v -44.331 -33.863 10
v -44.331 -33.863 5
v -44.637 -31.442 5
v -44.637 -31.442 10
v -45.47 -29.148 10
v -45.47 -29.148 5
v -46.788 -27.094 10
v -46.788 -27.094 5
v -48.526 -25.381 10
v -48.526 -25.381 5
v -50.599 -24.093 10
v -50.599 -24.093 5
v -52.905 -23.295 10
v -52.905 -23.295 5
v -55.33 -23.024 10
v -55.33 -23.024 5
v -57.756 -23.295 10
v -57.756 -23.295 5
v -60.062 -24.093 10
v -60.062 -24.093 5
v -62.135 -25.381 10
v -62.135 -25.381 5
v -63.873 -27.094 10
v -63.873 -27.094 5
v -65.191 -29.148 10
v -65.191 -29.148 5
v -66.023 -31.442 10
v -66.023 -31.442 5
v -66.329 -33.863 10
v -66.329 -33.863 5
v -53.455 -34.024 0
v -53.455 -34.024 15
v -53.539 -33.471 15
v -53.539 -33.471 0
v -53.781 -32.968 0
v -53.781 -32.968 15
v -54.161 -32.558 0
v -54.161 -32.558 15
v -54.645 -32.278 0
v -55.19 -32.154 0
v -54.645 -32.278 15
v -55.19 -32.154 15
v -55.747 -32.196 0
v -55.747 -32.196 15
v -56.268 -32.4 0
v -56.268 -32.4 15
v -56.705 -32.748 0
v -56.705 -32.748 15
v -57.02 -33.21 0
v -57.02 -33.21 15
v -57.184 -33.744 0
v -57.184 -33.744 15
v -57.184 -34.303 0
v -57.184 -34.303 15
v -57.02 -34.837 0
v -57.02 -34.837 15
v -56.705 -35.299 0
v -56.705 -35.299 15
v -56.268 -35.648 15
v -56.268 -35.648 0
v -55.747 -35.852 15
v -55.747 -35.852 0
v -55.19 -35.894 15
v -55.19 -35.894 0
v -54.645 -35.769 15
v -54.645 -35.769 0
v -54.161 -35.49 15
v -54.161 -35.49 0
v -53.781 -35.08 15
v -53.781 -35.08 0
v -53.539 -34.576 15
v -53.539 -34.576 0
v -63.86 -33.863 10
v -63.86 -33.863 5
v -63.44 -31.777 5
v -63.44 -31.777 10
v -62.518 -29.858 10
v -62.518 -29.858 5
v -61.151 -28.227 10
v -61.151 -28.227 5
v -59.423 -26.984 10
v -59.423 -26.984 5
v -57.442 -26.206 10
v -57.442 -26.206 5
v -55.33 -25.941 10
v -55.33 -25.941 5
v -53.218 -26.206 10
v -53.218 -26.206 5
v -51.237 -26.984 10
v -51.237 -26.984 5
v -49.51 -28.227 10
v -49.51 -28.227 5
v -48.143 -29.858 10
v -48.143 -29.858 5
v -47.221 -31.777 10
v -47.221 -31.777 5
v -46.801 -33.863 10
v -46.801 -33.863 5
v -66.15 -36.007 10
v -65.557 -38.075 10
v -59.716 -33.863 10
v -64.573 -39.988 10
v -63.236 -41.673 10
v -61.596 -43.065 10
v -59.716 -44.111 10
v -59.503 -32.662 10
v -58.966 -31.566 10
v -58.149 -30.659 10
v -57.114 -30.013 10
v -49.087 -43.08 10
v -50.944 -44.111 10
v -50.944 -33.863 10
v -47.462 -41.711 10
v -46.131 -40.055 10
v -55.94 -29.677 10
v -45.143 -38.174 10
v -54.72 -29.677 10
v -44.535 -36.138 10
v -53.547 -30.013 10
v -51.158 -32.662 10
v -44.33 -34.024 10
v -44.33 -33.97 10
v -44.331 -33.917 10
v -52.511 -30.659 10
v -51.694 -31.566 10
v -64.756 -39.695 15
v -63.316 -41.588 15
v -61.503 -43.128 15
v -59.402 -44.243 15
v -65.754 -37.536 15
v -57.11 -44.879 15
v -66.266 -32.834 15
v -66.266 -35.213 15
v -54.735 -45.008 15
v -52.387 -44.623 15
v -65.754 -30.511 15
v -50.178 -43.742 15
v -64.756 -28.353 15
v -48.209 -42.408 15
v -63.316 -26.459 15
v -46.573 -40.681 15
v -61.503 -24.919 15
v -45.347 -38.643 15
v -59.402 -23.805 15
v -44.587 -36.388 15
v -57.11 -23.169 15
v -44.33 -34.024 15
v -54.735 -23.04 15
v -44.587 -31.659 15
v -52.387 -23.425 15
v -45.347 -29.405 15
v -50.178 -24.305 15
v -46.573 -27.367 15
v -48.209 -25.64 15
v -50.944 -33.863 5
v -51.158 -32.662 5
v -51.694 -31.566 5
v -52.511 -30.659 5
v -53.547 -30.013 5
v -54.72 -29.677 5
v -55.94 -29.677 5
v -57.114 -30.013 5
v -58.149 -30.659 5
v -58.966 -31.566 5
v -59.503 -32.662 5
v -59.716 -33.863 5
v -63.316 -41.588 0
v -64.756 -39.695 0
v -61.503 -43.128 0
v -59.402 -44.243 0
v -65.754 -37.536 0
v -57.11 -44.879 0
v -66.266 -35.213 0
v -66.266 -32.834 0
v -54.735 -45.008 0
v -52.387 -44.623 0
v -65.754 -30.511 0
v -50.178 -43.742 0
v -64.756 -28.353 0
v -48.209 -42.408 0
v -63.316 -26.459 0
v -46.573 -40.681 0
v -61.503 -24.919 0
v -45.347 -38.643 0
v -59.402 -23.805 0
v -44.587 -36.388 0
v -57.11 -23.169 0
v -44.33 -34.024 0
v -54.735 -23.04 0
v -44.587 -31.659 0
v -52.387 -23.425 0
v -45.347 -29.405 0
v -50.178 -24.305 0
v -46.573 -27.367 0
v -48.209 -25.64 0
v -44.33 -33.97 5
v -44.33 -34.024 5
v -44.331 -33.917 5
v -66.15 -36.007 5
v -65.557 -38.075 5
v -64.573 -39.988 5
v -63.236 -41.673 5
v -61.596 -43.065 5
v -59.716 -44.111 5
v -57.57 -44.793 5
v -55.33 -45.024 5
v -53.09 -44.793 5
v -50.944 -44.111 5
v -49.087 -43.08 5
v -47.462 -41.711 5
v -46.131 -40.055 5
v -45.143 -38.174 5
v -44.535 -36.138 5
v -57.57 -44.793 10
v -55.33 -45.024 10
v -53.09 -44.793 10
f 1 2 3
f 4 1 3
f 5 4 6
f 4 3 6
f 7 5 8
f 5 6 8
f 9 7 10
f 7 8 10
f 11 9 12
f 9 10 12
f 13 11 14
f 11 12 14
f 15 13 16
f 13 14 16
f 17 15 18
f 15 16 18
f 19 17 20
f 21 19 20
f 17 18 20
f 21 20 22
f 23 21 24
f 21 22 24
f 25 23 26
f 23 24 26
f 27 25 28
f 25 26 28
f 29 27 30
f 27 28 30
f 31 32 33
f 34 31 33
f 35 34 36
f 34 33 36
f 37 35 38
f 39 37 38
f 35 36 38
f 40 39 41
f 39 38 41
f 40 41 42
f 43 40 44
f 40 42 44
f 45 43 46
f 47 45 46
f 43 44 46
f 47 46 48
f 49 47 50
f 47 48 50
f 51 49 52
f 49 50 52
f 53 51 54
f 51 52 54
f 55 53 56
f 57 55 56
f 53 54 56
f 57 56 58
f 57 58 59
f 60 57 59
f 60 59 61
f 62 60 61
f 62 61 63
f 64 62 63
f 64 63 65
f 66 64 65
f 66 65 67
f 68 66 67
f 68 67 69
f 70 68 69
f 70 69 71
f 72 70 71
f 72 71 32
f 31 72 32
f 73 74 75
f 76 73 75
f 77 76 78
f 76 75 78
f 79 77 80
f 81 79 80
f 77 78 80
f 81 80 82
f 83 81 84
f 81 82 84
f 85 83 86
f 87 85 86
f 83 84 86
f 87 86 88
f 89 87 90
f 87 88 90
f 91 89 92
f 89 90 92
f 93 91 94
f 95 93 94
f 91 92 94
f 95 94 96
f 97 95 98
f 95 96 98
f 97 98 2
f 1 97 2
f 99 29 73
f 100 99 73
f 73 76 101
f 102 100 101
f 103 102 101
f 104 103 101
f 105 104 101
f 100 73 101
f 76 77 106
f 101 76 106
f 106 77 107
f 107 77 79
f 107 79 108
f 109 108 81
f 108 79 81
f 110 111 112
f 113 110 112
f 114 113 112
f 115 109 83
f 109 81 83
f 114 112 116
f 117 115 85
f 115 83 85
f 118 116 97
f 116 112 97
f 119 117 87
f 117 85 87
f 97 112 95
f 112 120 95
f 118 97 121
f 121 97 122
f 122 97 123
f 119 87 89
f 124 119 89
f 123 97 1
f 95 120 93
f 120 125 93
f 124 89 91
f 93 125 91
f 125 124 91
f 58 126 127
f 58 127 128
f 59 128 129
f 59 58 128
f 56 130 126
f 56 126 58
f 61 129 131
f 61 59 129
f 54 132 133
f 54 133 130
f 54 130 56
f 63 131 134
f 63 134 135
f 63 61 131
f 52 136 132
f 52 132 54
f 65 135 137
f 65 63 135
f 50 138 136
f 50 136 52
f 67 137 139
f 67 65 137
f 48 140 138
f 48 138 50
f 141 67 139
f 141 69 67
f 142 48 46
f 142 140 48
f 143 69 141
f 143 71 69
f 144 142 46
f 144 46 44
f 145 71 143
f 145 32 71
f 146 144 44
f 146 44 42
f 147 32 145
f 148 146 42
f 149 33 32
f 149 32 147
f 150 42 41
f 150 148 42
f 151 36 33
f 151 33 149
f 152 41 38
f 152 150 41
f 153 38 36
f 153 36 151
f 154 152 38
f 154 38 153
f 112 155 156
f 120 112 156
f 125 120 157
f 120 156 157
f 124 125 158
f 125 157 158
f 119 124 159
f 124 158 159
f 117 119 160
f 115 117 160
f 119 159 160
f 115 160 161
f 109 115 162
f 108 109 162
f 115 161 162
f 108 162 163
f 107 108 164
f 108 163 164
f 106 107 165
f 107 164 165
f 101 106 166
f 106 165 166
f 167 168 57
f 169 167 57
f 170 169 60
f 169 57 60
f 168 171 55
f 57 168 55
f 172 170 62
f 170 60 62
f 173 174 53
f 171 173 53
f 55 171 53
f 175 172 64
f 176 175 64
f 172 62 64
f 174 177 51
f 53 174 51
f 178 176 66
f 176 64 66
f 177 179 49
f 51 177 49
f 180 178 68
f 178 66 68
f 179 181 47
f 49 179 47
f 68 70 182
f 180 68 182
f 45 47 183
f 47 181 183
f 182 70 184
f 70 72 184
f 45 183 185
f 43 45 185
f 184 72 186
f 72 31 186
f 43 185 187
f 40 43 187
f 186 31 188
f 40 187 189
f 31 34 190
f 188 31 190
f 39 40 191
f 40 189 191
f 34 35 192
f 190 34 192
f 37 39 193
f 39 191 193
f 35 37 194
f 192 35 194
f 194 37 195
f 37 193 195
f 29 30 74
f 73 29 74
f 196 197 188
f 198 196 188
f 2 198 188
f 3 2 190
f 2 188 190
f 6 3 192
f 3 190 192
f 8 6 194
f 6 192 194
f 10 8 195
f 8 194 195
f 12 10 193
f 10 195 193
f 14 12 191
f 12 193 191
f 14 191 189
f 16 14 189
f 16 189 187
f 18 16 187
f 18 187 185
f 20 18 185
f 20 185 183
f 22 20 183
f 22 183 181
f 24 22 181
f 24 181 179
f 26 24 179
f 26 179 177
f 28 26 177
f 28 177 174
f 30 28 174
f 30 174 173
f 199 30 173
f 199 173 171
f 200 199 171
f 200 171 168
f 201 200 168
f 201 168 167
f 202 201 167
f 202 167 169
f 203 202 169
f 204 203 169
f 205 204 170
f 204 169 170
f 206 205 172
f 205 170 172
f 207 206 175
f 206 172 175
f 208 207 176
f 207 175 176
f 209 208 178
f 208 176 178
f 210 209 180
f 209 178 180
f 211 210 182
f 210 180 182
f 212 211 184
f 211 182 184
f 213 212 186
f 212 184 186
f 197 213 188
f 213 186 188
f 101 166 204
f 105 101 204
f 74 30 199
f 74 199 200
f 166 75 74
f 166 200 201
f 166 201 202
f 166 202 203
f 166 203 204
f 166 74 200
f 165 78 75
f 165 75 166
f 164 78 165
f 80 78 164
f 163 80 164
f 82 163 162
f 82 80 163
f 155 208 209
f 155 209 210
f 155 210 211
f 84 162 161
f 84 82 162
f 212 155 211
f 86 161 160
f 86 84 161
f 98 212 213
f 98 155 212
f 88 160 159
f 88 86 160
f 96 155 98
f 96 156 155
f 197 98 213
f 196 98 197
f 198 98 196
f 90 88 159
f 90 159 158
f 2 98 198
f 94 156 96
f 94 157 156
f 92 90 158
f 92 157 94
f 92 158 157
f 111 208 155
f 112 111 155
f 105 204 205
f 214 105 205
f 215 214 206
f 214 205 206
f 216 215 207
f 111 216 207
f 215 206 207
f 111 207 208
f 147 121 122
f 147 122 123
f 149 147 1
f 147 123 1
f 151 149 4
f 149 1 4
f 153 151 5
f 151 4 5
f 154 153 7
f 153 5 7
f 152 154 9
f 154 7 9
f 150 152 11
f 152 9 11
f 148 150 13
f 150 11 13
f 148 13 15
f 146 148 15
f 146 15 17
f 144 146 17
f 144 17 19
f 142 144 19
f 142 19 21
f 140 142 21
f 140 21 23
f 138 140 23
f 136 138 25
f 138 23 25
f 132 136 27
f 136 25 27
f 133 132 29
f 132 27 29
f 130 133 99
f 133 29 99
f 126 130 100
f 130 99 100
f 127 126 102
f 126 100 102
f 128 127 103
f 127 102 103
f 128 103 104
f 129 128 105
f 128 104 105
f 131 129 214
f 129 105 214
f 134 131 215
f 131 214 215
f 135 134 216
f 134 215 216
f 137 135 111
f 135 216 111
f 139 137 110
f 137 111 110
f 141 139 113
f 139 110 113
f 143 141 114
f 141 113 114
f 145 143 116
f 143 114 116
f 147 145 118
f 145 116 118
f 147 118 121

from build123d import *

# Parameters (mm, degrees)
F0_R     = 11
F1_DEPTH = 5
F3_DEPTH = 5
F4_R     = 11
F5_DEPTH = 5
F6_R     = 1.875
F7_DEPTH = 25


with BuildPart() as f1:
    # F0 (on Top) → F1 (new body)
    with BuildSketch(Plane.XY):
        with Locations((-55.3302019835, -34.0237878263)):
            Circle(F0_R)
    extrude(amount=F1_DEPTH)

    # F2 (on face) → F3 (join)
    with BuildSketch(Plane.XY.offset(5)):
        with BuildLine():
            Line((-46.800726779, -33.8632795051), (-44.3313730877, -33.8632795051))
            ThreePointArc((-44.3313730877, -33.8632795051), (-55.3302019835, -23.0237878263), (-66.3290308792, -33.8632795051))
            Line((-66.3290308792, -33.8632795051), (-63.8596771879, -33.8632795051))
            ThreePointArc((-63.8596771879, -33.8632795051), (-55.3302019835, -25.9412589779), (-46.800726779, -33.8632795051))
        make_face()
        with BuildLine():
            ThreePointArc((-59.7163877129, -44.1114721367), (-55.3302019835, -45.0237878263), (-50.944016254, -44.1114721367))
            Line((-50.944016254, -44.1114721367), (-50.944016254, -34.1842961475))
            Line((-50.944016254, -34.1842961475), (-50.944016254, -33.8632795051))
            ThreePointArc((-50.944016254, -33.8632795051), (-55.3302019835, -29.6346662543), (-59.7163877129, -33.8632795051))
            Line((-59.7163877129, -33.8632795051), (-59.7163877129, -34.1842961475))
            Line((-59.7163877129, -34.1842961475), (-59.7163877129, -44.1114721367))
        make_face()
    extrude(amount=F3_DEPTH)

    # F4 (on face) → F5 (join)
    with BuildSketch(Plane.XY.offset(10)):
        with Locations((-55.3302019835, -34.0237878263)):
            Circle(F4_R)
    extrude(amount=F5_DEPTH)

    # F6 (on face) → F7 (cut)
    with BuildSketch(Plane.XY.offset(15)):
        with Locations((-55.3302019835, -34.0237878263)):
            Circle(F6_R)
    extrude(amount=-F7_DEPTH, mode=Mode.SUBTRACT)


solid = f1.part
